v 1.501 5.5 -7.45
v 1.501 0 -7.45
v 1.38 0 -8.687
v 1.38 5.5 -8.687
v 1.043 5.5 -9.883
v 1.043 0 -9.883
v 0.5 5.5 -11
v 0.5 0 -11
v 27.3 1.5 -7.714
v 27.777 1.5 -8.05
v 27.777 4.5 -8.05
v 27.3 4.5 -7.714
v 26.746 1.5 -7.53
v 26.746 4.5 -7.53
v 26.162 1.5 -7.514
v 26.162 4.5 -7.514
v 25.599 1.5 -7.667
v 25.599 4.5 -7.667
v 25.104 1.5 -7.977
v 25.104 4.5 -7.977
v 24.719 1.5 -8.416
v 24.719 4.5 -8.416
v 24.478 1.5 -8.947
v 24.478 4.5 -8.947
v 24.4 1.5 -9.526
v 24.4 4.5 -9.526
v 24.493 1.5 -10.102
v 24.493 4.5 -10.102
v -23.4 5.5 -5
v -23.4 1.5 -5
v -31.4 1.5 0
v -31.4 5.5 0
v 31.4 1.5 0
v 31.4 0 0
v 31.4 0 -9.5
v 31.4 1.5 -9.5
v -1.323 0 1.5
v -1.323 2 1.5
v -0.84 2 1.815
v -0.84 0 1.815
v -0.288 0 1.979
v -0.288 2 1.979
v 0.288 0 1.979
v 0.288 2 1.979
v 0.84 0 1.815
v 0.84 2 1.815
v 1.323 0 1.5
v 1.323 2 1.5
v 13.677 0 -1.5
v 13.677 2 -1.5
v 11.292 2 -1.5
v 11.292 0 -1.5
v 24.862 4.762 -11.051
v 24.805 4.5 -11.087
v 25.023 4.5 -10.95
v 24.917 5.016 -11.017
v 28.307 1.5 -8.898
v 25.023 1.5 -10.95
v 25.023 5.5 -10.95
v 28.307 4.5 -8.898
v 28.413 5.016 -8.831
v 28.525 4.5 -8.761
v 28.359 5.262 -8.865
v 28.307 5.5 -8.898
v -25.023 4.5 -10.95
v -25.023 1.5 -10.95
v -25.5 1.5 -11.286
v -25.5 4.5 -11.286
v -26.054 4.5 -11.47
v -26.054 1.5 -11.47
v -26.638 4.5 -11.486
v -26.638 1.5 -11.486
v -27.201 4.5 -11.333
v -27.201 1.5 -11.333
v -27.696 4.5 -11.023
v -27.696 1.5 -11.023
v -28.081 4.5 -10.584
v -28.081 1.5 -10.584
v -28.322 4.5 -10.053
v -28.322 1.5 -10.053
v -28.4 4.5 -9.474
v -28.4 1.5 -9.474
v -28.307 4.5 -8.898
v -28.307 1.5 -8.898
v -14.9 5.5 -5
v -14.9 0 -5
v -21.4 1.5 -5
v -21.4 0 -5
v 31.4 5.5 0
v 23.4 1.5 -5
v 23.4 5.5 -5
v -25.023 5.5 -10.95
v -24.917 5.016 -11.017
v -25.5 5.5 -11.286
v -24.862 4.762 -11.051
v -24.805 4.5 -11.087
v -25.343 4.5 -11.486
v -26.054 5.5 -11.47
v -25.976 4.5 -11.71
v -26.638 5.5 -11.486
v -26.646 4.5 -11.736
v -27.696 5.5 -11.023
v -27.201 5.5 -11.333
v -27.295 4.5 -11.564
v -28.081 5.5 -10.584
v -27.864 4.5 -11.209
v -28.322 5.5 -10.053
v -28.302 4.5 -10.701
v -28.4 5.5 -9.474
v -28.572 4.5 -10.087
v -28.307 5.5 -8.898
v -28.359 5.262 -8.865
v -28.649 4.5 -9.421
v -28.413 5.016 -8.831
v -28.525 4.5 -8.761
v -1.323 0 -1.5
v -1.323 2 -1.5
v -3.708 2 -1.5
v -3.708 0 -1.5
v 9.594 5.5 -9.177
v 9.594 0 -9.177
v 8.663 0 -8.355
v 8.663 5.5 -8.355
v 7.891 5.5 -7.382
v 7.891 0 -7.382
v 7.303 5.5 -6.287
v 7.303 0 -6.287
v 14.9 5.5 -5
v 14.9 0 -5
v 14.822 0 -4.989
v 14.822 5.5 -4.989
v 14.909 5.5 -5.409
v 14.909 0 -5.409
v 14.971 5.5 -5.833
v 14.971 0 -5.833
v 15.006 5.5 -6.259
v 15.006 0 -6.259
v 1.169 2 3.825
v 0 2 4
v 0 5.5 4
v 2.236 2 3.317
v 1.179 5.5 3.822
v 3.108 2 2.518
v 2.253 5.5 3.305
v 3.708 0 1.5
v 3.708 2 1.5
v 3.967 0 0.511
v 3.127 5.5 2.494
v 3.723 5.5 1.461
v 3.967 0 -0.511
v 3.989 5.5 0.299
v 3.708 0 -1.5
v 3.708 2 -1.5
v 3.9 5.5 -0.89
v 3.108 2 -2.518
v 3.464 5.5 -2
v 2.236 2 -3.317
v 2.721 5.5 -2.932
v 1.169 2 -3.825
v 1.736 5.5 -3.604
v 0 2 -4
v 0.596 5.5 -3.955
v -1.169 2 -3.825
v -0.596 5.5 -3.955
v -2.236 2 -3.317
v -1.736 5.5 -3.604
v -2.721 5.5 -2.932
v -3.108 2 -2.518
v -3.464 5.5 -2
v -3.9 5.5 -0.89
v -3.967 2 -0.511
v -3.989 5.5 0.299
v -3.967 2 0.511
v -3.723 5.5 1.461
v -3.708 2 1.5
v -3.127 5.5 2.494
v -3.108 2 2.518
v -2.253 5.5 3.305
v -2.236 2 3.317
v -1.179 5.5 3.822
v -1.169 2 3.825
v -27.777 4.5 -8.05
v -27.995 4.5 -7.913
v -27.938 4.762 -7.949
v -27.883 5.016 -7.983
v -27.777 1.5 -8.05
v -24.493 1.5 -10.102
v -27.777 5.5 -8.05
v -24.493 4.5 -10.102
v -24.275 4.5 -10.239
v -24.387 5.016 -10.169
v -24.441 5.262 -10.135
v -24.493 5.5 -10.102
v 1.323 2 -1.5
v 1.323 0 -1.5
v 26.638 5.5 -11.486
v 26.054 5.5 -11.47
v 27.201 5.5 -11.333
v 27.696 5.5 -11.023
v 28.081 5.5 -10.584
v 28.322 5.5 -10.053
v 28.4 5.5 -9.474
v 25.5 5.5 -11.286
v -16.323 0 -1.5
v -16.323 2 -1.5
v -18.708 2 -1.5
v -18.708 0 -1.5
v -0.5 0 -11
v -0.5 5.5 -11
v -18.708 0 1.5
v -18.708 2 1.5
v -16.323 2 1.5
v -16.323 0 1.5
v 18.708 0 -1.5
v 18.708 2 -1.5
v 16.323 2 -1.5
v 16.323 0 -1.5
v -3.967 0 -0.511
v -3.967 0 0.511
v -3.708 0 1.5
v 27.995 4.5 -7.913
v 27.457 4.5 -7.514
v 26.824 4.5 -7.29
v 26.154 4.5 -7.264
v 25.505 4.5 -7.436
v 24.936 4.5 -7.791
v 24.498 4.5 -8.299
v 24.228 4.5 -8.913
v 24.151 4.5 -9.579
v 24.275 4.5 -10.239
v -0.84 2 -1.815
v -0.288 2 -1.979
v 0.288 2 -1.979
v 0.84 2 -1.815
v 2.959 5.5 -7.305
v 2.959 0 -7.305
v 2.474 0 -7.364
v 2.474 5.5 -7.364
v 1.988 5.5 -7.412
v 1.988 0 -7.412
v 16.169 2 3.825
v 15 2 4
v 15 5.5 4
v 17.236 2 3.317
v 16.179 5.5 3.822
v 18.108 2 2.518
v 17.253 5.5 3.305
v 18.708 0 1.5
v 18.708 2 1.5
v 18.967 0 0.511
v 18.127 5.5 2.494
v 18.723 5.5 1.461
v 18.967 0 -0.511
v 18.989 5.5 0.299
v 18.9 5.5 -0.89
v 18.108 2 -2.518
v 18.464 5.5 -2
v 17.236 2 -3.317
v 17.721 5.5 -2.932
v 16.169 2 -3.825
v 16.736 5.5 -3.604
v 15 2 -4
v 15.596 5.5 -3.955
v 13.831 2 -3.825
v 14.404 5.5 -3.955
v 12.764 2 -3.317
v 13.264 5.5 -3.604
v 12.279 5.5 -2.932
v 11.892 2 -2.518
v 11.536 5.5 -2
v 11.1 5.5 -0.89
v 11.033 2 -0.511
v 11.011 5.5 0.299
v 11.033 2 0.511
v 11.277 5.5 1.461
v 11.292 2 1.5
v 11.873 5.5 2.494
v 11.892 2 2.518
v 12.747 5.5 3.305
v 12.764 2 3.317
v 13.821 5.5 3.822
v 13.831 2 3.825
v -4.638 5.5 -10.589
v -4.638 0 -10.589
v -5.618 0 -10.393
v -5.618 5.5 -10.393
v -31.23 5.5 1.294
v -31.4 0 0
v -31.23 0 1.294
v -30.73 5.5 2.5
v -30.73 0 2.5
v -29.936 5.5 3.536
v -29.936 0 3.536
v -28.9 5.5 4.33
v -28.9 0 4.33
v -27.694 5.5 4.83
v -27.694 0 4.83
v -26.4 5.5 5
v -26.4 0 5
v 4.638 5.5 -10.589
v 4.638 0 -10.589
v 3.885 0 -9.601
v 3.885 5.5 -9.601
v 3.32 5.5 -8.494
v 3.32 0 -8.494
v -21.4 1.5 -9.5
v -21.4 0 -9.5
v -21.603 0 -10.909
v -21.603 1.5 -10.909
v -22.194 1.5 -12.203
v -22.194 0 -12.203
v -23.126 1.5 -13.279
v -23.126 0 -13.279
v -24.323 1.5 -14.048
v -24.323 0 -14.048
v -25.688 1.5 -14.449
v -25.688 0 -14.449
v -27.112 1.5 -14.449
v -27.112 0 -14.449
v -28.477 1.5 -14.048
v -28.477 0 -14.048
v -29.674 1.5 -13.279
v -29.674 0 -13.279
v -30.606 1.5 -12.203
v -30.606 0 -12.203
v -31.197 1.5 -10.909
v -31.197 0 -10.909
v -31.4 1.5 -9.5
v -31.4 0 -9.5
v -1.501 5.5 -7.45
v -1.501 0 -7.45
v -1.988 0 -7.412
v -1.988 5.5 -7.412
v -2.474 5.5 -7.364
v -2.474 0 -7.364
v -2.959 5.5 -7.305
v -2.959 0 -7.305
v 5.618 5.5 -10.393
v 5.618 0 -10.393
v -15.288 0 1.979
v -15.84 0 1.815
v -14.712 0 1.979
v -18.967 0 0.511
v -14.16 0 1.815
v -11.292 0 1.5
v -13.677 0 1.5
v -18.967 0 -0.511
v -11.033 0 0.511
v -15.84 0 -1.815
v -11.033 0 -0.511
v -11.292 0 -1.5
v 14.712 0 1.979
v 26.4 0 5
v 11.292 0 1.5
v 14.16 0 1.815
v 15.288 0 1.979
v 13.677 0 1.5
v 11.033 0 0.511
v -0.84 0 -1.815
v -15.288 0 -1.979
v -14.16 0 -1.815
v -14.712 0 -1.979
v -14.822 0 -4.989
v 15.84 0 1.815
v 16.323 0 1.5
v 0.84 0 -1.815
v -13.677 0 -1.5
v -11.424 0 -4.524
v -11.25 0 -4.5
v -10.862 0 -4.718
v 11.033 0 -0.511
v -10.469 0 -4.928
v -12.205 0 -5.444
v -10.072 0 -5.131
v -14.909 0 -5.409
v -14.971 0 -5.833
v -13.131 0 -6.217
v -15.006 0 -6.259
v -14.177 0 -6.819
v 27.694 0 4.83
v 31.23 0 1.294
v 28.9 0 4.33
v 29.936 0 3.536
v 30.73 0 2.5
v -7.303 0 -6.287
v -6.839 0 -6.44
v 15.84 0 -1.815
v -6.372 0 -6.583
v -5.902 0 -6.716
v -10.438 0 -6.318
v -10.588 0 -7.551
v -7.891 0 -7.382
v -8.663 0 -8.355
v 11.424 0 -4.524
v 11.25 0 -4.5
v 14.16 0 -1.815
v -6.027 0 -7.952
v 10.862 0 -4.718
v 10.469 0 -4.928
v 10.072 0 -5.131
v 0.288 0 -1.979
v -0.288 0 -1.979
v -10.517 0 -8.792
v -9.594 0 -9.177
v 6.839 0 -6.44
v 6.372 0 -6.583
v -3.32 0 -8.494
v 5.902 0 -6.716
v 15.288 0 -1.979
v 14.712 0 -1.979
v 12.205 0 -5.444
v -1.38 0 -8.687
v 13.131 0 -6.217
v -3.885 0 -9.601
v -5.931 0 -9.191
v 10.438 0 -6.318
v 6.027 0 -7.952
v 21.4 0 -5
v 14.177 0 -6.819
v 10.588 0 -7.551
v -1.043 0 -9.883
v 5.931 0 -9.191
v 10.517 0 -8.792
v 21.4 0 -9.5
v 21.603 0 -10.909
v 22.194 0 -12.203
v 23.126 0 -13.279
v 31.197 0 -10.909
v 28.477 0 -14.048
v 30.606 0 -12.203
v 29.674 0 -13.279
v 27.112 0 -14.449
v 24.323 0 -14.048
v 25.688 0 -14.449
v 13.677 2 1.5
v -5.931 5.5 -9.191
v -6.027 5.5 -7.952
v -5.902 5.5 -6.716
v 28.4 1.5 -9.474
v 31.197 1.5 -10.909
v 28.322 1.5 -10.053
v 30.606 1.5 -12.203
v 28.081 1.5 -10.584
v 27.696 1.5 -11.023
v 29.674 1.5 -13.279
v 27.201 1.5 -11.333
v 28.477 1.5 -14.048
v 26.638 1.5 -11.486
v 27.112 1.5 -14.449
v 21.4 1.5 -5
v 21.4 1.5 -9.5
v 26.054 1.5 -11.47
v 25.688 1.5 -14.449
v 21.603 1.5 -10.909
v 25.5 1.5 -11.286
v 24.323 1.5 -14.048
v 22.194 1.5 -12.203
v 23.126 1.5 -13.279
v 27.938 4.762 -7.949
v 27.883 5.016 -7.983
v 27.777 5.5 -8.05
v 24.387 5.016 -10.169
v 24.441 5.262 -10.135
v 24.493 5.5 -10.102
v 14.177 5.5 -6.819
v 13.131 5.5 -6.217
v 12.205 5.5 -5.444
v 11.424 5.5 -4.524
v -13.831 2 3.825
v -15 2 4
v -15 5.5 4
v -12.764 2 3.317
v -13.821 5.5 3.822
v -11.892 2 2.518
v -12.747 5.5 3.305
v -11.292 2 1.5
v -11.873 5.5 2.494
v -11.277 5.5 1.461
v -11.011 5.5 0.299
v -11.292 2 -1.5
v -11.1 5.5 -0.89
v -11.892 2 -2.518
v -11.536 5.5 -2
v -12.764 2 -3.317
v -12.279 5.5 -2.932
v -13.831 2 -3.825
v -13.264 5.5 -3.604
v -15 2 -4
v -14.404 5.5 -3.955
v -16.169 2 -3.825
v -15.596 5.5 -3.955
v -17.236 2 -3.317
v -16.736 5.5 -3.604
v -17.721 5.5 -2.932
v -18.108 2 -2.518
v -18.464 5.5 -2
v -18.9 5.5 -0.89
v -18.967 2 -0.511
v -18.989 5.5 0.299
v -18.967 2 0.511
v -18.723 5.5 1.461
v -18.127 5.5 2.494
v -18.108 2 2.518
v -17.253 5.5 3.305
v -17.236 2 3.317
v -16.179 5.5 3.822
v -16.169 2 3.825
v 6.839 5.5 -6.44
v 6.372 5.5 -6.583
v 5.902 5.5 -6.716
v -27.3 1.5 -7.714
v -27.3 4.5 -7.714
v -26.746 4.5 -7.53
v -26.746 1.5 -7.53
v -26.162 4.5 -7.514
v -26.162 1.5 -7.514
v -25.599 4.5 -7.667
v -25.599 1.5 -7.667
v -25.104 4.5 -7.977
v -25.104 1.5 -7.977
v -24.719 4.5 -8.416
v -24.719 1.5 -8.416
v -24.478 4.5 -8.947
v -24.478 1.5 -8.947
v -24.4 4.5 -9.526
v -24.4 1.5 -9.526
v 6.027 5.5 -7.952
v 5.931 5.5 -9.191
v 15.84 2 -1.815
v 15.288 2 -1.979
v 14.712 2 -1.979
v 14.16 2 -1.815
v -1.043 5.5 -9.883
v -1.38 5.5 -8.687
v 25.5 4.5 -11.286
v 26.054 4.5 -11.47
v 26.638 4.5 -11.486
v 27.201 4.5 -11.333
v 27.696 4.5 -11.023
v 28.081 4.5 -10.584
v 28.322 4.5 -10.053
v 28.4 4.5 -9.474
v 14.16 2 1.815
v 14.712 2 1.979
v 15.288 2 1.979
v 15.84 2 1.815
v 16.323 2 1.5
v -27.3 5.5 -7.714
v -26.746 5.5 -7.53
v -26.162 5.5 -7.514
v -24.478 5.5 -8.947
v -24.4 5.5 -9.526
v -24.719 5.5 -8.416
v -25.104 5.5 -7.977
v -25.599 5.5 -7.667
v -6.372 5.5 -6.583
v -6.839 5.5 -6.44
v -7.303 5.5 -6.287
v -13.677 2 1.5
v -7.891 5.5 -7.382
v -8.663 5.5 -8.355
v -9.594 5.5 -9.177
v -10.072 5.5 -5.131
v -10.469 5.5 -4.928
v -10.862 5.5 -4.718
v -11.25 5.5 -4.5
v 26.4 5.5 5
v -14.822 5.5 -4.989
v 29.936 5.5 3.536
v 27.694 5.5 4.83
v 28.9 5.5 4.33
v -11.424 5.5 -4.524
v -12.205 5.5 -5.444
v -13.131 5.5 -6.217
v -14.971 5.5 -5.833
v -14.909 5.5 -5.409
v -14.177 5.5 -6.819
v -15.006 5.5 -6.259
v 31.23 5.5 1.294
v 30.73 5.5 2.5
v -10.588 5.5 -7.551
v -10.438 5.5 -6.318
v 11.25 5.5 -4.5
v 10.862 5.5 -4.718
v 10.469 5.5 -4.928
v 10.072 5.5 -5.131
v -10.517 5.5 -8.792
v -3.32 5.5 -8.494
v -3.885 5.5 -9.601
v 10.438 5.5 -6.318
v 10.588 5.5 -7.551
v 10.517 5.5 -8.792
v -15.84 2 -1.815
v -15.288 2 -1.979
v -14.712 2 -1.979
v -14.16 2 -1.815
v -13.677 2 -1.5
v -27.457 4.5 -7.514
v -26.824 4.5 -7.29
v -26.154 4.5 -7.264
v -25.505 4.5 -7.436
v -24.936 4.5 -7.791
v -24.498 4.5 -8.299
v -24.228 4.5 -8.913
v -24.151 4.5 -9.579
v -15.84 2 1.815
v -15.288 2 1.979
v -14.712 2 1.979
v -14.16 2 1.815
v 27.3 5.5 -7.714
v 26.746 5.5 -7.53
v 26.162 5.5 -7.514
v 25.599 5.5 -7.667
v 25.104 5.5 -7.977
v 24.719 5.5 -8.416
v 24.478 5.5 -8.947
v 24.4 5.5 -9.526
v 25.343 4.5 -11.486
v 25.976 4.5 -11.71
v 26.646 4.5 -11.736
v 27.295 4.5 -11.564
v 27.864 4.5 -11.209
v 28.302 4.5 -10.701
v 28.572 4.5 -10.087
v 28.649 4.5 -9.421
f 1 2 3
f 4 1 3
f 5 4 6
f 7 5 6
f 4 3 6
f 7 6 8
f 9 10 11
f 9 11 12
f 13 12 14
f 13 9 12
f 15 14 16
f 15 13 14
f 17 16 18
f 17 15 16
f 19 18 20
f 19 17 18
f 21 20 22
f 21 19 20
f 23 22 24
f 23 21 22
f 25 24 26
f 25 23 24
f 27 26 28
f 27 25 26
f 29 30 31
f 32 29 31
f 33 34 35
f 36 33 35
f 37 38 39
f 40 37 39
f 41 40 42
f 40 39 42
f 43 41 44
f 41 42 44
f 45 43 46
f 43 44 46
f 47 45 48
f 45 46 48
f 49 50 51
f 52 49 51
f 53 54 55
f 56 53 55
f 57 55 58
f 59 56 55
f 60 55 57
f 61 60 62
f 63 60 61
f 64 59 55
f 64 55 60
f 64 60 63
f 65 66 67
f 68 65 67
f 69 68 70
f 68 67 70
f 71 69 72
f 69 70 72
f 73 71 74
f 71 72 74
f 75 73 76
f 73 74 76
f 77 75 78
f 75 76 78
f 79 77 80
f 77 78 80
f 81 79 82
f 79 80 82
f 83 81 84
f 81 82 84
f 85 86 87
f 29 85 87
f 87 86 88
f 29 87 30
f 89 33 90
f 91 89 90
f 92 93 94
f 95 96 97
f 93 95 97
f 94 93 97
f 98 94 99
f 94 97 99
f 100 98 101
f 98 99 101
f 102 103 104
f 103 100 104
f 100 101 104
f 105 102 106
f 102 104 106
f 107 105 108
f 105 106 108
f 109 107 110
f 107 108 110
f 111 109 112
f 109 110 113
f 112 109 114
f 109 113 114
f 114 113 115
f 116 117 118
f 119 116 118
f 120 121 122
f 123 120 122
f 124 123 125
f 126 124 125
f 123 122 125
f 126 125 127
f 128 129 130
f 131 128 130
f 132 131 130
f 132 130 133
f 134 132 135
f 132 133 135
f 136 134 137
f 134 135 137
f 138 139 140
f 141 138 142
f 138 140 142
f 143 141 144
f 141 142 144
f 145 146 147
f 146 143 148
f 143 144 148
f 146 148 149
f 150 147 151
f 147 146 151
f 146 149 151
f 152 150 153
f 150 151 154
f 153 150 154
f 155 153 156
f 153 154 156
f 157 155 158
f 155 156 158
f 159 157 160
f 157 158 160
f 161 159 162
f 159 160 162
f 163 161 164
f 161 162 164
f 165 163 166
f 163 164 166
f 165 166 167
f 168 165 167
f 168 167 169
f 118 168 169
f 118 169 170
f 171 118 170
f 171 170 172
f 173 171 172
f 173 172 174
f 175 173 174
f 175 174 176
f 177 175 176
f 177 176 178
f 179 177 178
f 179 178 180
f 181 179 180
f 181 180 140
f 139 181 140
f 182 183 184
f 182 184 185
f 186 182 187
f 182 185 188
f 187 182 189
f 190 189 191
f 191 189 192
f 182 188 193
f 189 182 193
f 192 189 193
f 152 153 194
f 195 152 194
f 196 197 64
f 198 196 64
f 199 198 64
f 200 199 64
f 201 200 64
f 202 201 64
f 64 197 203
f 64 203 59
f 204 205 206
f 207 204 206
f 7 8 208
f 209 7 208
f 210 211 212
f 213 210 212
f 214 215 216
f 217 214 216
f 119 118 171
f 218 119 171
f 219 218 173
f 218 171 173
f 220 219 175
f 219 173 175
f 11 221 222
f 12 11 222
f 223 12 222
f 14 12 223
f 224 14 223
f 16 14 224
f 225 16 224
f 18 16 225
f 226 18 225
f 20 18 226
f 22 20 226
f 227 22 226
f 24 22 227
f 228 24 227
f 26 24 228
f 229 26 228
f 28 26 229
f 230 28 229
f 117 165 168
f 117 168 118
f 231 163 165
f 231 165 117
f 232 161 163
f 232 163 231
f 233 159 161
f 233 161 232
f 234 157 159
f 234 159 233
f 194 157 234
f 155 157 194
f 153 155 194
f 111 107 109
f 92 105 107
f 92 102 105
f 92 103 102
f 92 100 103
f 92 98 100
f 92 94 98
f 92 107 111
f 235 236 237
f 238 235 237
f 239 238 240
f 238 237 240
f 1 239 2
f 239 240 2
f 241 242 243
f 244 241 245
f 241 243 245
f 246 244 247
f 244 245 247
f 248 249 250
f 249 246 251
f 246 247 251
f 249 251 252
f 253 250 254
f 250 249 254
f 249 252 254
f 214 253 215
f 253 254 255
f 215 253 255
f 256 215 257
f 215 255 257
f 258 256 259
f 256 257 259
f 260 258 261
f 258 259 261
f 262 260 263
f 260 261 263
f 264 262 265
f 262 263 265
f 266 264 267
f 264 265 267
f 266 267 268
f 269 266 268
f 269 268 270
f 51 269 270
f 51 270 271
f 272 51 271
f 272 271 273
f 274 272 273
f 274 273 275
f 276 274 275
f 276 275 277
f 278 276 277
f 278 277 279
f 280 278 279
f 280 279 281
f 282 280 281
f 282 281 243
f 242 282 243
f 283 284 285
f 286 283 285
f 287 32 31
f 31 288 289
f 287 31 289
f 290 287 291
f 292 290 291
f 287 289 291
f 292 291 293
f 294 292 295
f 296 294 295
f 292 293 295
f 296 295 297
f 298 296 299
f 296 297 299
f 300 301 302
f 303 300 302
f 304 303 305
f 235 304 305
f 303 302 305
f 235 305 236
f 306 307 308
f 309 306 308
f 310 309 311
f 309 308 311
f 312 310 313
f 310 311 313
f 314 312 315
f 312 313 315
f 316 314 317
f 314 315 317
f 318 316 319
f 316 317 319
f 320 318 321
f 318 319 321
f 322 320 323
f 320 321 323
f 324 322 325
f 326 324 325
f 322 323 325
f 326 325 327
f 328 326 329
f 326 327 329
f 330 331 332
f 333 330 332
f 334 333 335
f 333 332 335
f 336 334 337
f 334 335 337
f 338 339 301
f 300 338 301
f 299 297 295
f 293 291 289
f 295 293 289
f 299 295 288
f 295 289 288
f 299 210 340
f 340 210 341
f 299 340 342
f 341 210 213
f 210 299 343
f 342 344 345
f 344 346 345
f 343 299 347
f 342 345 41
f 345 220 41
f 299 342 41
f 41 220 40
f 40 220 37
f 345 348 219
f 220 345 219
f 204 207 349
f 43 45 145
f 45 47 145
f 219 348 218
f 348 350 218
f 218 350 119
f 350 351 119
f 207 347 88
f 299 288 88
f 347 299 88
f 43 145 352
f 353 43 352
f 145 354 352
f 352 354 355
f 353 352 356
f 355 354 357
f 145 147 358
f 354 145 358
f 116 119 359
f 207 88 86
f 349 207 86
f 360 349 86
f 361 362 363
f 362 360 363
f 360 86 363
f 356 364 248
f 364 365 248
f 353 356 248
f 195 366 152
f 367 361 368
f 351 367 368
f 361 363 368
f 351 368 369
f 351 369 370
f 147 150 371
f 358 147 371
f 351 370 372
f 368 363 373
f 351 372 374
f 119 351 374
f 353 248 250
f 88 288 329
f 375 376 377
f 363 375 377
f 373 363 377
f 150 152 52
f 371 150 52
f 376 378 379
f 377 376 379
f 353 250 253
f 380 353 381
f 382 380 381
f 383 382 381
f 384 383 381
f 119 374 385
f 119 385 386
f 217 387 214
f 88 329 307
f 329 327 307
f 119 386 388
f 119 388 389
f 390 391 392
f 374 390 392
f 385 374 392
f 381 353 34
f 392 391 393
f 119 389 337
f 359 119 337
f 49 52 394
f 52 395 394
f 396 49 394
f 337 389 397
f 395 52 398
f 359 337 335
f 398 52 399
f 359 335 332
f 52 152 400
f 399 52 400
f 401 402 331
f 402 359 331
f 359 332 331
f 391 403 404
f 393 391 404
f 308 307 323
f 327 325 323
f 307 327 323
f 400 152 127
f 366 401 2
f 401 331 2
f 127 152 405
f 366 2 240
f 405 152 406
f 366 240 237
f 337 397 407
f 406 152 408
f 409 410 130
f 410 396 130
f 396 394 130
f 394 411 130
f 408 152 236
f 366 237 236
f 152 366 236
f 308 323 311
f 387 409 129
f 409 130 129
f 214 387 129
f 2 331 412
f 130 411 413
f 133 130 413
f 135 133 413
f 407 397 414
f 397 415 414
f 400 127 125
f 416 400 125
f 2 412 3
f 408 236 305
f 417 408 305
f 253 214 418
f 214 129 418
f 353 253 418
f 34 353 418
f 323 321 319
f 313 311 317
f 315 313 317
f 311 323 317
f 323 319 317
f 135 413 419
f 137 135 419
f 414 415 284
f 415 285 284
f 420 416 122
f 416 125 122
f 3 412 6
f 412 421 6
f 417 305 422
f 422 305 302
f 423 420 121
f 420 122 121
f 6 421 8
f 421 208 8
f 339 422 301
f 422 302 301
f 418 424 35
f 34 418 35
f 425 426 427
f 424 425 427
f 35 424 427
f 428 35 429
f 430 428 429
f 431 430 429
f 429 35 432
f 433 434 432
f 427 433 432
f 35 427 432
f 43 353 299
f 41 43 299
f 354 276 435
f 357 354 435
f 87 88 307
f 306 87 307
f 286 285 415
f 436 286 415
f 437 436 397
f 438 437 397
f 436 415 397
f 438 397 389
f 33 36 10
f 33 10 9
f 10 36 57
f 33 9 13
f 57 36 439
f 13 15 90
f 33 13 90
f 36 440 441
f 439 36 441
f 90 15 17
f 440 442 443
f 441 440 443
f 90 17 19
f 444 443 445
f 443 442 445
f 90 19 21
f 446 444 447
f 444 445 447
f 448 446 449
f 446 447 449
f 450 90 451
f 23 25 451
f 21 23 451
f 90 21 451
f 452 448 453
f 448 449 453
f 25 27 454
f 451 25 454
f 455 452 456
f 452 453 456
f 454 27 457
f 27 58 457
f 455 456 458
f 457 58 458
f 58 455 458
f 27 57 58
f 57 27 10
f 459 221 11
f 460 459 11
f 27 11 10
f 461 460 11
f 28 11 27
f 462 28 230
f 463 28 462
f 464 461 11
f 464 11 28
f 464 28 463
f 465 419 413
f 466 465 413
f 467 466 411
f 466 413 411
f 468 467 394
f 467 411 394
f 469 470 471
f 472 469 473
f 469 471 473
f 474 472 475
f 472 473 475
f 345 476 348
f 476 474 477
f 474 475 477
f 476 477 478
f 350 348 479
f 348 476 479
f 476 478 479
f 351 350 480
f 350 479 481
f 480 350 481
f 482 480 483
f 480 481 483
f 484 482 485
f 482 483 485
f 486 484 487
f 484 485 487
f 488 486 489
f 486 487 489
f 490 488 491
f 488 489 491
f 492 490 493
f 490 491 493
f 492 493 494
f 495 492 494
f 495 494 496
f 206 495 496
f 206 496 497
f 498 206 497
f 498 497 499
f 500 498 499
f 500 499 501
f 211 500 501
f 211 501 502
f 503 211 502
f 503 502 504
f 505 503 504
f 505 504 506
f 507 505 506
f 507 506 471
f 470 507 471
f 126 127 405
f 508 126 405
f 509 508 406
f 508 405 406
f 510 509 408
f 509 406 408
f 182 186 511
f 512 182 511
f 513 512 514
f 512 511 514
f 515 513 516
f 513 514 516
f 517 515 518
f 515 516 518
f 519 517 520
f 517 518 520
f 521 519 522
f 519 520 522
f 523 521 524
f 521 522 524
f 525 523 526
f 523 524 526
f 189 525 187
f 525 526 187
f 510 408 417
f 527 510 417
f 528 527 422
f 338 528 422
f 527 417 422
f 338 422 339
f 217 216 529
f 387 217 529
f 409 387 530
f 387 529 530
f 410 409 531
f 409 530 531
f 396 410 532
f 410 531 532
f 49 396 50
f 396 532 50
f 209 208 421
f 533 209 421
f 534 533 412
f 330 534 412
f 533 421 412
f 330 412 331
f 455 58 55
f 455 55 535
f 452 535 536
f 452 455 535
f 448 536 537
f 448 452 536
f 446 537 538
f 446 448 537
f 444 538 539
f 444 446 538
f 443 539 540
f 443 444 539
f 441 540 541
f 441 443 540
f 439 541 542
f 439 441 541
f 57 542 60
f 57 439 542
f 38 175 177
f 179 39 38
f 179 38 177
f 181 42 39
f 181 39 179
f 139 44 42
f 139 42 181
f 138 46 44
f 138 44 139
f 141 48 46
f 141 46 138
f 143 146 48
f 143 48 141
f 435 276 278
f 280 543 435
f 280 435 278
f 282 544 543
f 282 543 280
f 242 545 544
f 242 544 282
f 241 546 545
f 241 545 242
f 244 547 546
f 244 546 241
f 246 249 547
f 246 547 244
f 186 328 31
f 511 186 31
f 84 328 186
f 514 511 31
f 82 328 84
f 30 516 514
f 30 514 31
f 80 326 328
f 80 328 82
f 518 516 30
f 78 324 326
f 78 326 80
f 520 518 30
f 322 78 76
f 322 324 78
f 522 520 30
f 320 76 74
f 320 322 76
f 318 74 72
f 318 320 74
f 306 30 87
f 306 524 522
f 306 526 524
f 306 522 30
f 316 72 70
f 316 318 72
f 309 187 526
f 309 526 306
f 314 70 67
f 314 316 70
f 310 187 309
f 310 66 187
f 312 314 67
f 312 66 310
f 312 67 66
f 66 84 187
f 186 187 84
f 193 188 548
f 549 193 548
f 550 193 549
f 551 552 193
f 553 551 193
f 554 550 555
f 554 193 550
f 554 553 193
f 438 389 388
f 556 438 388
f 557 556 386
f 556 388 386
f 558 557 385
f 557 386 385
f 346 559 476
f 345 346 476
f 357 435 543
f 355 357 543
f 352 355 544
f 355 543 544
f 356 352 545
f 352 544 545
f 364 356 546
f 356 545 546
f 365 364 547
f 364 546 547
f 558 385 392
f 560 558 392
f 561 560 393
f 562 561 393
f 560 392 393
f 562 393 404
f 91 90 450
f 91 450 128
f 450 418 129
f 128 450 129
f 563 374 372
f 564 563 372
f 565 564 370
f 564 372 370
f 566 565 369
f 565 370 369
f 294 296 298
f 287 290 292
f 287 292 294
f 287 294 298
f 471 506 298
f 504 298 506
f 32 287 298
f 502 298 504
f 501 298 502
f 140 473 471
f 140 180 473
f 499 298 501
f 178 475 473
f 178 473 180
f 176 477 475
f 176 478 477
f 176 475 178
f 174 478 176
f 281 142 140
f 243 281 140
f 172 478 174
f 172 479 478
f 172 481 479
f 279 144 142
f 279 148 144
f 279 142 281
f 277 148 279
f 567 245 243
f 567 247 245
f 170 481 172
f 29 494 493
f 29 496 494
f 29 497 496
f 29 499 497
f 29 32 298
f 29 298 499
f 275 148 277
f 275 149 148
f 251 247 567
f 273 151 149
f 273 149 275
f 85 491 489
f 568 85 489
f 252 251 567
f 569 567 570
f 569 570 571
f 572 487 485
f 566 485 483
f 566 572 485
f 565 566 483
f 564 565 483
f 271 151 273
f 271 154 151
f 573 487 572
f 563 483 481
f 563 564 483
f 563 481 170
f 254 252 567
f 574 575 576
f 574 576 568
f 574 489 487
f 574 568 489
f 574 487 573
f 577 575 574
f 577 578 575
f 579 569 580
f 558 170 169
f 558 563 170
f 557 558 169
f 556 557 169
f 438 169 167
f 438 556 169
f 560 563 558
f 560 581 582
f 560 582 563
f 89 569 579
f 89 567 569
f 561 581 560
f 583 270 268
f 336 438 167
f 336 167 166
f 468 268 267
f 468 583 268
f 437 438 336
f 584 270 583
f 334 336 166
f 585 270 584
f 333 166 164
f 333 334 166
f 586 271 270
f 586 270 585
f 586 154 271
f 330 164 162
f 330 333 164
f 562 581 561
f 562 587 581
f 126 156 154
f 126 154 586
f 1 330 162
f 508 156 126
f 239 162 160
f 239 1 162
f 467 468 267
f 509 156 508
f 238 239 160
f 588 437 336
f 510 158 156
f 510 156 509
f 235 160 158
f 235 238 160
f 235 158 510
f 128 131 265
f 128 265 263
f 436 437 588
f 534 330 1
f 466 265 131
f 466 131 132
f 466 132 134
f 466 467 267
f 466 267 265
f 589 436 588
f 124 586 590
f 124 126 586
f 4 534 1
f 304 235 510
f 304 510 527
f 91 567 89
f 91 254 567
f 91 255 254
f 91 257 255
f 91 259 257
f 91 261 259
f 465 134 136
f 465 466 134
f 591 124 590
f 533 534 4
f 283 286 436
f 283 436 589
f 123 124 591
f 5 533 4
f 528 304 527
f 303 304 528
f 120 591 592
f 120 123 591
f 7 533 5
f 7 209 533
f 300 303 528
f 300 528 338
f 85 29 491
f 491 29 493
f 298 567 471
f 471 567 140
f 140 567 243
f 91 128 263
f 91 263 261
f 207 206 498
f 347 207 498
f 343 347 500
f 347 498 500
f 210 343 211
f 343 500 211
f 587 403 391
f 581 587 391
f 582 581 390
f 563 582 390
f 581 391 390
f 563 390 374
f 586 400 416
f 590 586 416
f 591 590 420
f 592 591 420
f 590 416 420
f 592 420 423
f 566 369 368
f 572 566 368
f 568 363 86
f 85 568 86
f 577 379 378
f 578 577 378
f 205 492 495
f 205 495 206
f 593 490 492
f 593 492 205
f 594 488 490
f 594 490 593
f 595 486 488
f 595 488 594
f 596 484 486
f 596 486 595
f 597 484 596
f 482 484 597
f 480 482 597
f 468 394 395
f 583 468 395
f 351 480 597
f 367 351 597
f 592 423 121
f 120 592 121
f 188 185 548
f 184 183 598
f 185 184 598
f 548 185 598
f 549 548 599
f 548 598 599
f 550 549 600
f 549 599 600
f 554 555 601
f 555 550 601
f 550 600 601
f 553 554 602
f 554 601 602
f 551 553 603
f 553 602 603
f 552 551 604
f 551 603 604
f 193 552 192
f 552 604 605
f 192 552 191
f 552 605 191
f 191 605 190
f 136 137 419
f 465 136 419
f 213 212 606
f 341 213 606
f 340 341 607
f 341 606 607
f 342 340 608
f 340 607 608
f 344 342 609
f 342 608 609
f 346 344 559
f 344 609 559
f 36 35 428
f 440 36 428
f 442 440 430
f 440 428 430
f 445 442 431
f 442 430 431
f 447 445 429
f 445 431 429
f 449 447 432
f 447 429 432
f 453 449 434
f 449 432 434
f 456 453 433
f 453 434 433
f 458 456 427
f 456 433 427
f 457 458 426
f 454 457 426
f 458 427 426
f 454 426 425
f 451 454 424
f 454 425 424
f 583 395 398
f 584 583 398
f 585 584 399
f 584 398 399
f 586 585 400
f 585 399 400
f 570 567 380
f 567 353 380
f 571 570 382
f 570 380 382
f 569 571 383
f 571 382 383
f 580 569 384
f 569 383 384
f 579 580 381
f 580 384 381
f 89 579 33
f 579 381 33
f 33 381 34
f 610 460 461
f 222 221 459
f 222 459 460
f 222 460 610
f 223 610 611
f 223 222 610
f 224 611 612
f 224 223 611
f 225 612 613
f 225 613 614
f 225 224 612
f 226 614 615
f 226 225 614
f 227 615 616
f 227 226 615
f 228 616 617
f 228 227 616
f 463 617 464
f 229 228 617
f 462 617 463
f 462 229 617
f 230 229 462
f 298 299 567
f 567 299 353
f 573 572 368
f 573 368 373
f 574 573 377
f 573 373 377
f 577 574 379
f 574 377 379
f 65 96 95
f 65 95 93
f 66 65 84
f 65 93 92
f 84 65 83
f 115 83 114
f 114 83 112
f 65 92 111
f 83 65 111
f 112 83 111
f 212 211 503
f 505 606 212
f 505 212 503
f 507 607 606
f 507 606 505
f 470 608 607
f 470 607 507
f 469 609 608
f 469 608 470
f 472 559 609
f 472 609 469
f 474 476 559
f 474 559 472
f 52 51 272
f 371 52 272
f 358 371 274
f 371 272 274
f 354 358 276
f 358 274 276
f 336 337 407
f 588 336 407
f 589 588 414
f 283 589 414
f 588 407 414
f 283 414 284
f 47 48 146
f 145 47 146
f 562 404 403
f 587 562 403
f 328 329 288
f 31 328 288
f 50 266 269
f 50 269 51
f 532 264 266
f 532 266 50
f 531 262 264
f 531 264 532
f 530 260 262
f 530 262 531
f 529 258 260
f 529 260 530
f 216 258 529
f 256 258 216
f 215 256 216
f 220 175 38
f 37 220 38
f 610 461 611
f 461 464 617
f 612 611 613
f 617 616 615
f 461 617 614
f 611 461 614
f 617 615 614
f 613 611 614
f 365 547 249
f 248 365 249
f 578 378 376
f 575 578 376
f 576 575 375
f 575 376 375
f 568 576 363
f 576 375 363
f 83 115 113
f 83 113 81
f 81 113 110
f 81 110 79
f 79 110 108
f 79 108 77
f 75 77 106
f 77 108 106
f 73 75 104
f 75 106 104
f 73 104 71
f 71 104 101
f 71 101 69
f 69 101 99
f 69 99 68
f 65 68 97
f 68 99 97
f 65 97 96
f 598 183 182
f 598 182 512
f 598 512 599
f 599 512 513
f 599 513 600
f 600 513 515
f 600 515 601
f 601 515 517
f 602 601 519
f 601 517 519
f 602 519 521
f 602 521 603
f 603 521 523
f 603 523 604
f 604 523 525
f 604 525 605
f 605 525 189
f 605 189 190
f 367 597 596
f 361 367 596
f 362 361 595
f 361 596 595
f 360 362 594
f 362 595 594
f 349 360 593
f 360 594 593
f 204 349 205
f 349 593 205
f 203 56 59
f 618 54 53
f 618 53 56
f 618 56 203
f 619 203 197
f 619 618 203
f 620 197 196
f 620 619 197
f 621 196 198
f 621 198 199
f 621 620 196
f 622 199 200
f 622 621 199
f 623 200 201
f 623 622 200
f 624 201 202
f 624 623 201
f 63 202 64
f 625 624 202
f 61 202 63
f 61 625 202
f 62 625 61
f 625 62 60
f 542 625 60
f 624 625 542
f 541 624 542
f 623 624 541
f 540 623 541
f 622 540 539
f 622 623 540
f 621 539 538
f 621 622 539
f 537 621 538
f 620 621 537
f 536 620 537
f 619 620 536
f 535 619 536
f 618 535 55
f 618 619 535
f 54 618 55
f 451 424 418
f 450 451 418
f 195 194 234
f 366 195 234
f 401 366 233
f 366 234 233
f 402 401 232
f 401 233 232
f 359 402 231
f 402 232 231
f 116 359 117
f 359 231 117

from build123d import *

# Parameters (mm, degrees)
EXTRUDE_1_DEPTH                  = 1.5
EXTRUDE_2_DEPTH                  = 4
EXTRUDE_3_DEPTH                  = 5.5
PATTERN_CIRCULAR_1_COUNT         = 4
PATTERN_CIRCULAR_1_ANGLE         = 34
PATTERN_CIRCULAR_2_COPY_1_DEPTH  = 5.5
PATTERN_CIRCULAR_2_COPY_2_DEPTH  = 5.5
PATTERN_CIRCULAR_2_COPY_3_DEPTH  = 5.5
PATTERN_CIRCULAR_2_COPY_4_DEPTH  = 5.5
PATTERN_CIRCULAR_2_COPY_5_DEPTH  = 5.5
PATTERN_CIRCULAR_2_COPY_6_DEPTH  = 5.5
PATTERN_CIRCULAR_2_COPY_7_DEPTH  = 5.5
PATTERN_CIRCULAR_2_COPY_8_DEPTH  = 5.5
PATTERN_CIRCULAR_2_COPY_9_DEPTH  = 5.5
PATTERN_CIRCULAR_2_COPY_10_DEPTH = 5.5
PATTERN_CIRCULAR_2_COPY_11_DEPTH = 5.5
PATTERN_CIRCULAR_2_COPY_12_DEPTH = 5.5
SKETCH_4_R                       = 4
CUT_EXTRUDE_1_DEPTH              = 3.5
CUT_EXTRUDE_2_DEPTH              = 35.76291127
PATTERN_LINEAR_1_COUNT           = 2
PATTERN_LINEAR_1_PITCH           = 15
PATTERN_LINEAR_1_COL_COUNT       = 2
PATTERN_LINEAR_1_COL_PITCH       = 15
SKETCH_6_R                       = 2
EXTRUDE_4_DEPTH                  = 4
SKETCH_8_R                       = 2
SKETCH_7_R                       = 2.25
CUT_EXTRUDE_3_DEPTH              = 4


with BuildPart() as part:
    # 草图1 → 凸台-拉伸1 (new body)
    with BuildSketch(Plane(origin=(0, 0, 0), x_dir=(1, 0, 0), z_dir=(0, 1, 0))):
        with BuildLine():
            Line((-26.4, -5), (26.4, -5))
            ThreePointArc((26.4, -5), (29.935533906, -3.535533906), (31.4, 0))
            Line((31.4, 0), (31.4, 9.5))
            ThreePointArc((31.4, 9.5), (26.4, 14.5), (21.4, 9.5))
            Line((21.4, 9.5), (21.4, 5))
            Line((21.4, 5), (14.9, 5))
            Line((14.9, 5), (11.25, 4.5))
            ThreePointArc((11.25, 4.5), (0, 7.5), (-11.25, 4.5))
            Line((-11.25, 4.5), (-14.9, 5))
            Line((-14.9, 5), (-21.4, 5))
            Line((-21.4, 5), (-21.4, 9.5))
            ThreePointArc((-21.4, 9.5), (-26.4, 14.5), (-31.4, 9.5))
            Line((-31.4, 9.5), (-31.4, 0))
            ThreePointArc((-31.4, 0), (-29.935533906, -3.535533906), (-26.4, -5))
        make_face()
    extrude(amount=EXTRUDE_1_DEPTH)

    # 草图2 → 凸台-拉伸2 (add)
    with BuildSketch(Plane(origin=(0, 1.5, 0), x_dir=(1, 0, 0), z_dir=(0, 1, 0))):
        with BuildLine():
            Line((-21.4, 5), (-23.4, 5))
            Line((-23.4, 5), (-31.4, 0))
            ThreePointArc((-31.4, 0), (-29.935533906, -3.535533906), (-26.4, -5))
            Line((-26.4, -5), (26.4, -5))
            ThreePointArc((26.4, -5), (29.935533906, -3.535533906), (31.4, 0))
            Line((31.4, 0), (23.4, 5))
            Line((23.4, 5), (21.4, 5))
            Line((21.4, 5), (14.9, 5))
            Line((14.9, 5), (11.25, 4.5))
            ThreePointArc((11.25, 4.5), (0, 7.5), (-11.25, 4.5))
            Line((-11.25, 4.5), (-14.9, 5))
            Line((-14.9, 5), (-21.4, 5))
        make_face()
    extrude(amount=EXTRUDE_2_DEPTH)

    # 草图3 → 凸台-拉伸3 (add)
    with BuildSketch(Plane(origin=(0, 0, 0), x_dir=(1, 0, 0), z_dir=(0, 1, 0))):
        with BuildLine():
            Line((0.5, 11), (-0.5, 11))
            ThreePointArc((-0.5, 11), (-1.238266188, 9.292132892), (-1.500585783, 7.450113497))
            ThreePointArc((-1.500585783, 7.450113497), (0, 7.5), (1.500585783, 7.450113497))
            ThreePointArc((1.500585783, 7.450113497), (1.238266188, 9.292132892), (0.5, 11))
        make_face()
    extrude_3 = extrude(amount=EXTRUDE_3_DEPTH)

    # 阵列(圆周)1: 凸台-拉伸3 ×4 about axis
    pattern_circular_1_axis = Axis((0, 0, 15.09375), (0, -1, 0))
    for i in range(1, PATTERN_CIRCULAR_1_COUNT):
        add(extrude_3.rotate(pattern_circular_1_axis, i * PATTERN_CIRCULAR_1_ANGLE / (PATTERN_CIRCULAR_1_COUNT - 1)))

    # 阵列(圆周)2 copy 1 sketch → 阵列(圆周)2 copy 1 (add)
    with BuildSketch(Plane(origin=(0, 0, 0), x_dir=(1, 0, 0), z_dir=(0, 1, 0))):
        with BuildLine():
            Line((0.5, 11), (-0.5, 11))
            ThreePointArc((-0.5, 11), (-1.238266188, 9.292132892), (-1.500585783, 7.450113497))
            ThreePointArc((-1.500585783, 7.450113497), (0, 7.5), (1.500585783, 7.450113497))
            ThreePointArc((1.500585783, 7.450113497), (1.238266188, 9.292132892), (0.5, 11))
        make_face()
    extrude(amount=PATTERN_CIRCULAR_2_COPY_1_DEPTH)

    # 阵列(圆周)2 copy 2 sketch → 阵列(圆周)2 copy 2 (add)
    with BuildSketch(Plane(origin=(-2.966172575, 0, 0.294320642), x_dir=(0.9805004957559792, 0, -0.1965166095328305), z_dir=(0, 1, 0))):
        with BuildLine():
            Line((0.5, 11), (-0.5, 11))
            ThreePointArc((-0.5, 11), (-1.238266188, 9.292132892), (-1.500585783, 7.450113497))
            ThreePointArc((-1.500585783, 7.450113497), (0, 7.5), (1.500585783, 7.450113497))
            ThreePointArc((1.500585783, 7.450113497), (1.238266188, 9.292132892), (0.5, 11))
        make_face()
    extrude(amount=PATTERN_CIRCULAR_2_COPY_2_DEPTH)

    # 阵列(圆周)2 copy 3 sketch → 阵列(圆周)2 copy 3 (add)
    with BuildSketch(Plane(origin=(-5.816667361, 0, 1.165804356), x_dir=(0.922762444355442, 0, -0.3853692661424491), z_dir=(0, 1, 0))):
        with BuildLine():
            Line((0.5, 11), (-0.5, 11))
            ThreePointArc((-0.5, 11), (-1.238266188, 9.292132892), (-1.500585783, 7.450113497))
            ThreePointArc((-1.500585783, 7.450113497), (0, 7.5), (1.500585783, 7.450113497))
            ThreePointArc((1.500585783, 7.450113497), (1.238266188, 9.292132892), (0.5, 11))
        make_face()
    extrude(amount=PATTERN_CIRCULAR_2_COPY_3_DEPTH)

    # 阵列(圆周)2 copy 4 sketch → 阵列(圆周)2 copy 4 (add)
    with BuildSketch(Plane(origin=(2.966172575, 0, 0.294320642), x_dir=(0.9805004957559792, 0, 0.1965166095328305), z_dir=(0, 1, 0))):
        with BuildLine():
            Line((0.5, 11), (-0.5, 11))
            ThreePointArc((-0.5, 11), (-1.238266188, 9.292132892), (-1.500585783, 7.450113497))
            ThreePointArc((-1.500585783, 7.450113497), (0, 7.5), (1.500585783, 7.450113497))
            ThreePointArc((1.500585783, 7.450113497), (1.238266188, 9.292132892), (0.5, 11))
        make_face()
    extrude(amount=PATTERN_CIRCULAR_2_COPY_4_DEPTH)

    # 阵列(圆周)2 copy 5 sketch → 阵列(圆周)2 copy 5 (add)
    with BuildSketch(Plane(origin=(0, 0, 0), x_dir=(1, 0, 0), z_dir=(0, 1, 0))):
        with BuildLine():
            Line((0.5, 11), (-0.5, 11))
            ThreePointArc((-0.5, 11), (-1.238266188, 9.292132892), (-1.500585783, 7.450113497))
            ThreePointArc((-1.500585783, 7.450113497), (0, 7.5), (1.500585783, 7.450113497))
            ThreePointArc((1.500585783, 7.450113497), (1.238266188, 9.292132892), (0.5, 11))
        make_face()
    extrude(amount=PATTERN_CIRCULAR_2_COPY_5_DEPTH)

    # 阵列(圆周)2 copy 6 sketch → 阵列(圆周)2 copy 6 (add)
    with BuildSketch(Plane(origin=(-2.966172575, 0, 0.294320642), x_dir=(0.9805004957559792, 0, -0.19651660953283062), z_dir=(0, 1, 0))):
        with BuildLine():
            Line((0.5, 11), (-0.5, 11))
            ThreePointArc((-0.5, 11), (-1.238266188, 9.292132892), (-1.500585783, 7.450113497))
            ThreePointArc((-1.500585783, 7.450113497), (0, 7.5), (1.500585783, 7.450113497))
            ThreePointArc((1.500585783, 7.450113497), (1.238266188, 9.292132892), (0.5, 11))
        make_face()
    extrude(amount=PATTERN_CIRCULAR_2_COPY_6_DEPTH)

    # 阵列(圆周)2 copy 7 sketch → 阵列(圆周)2 copy 7 (add)
    with BuildSketch(Plane(origin=(5.816667361, 0, 1.165804356), x_dir=(0.922762444355442, 0, 0.3853692661424491), z_dir=(0, 1, 0))):
        with BuildLine():
            Line((0.5, 11), (-0.5, 11))
            ThreePointArc((-0.5, 11), (-1.238266188, 9.292132892), (-1.500585783, 7.450113497))
            ThreePointArc((-1.500585783, 7.450113497), (0, 7.5), (1.500585783, 7.450113497))
            ThreePointArc((1.500585783, 7.450113497), (1.238266188, 9.292132892), (0.5, 11))
        make_face()
    extrude(amount=PATTERN_CIRCULAR_2_COPY_7_DEPTH)

    # 阵列(圆周)2 copy 8 sketch → 阵列(圆周)2 copy 8 (add)
    with BuildSketch(Plane(origin=(2.966172575, 0, 0.294320642), x_dir=(0.9805004957559792, 0, 0.19651660953283062), z_dir=(0, 1, 0))):
        with BuildLine():
            Line((0.5, 11), (-0.5, 11))
            ThreePointArc((-0.5, 11), (-1.238266188, 9.292132892), (-1.500585783, 7.450113497))
            ThreePointArc((-1.500585783, 7.450113497), (0, 7.5), (1.500585783, 7.450113497))
            ThreePointArc((1.500585783, 7.450113497), (1.238266188, 9.292132892), (0.5, 11))
        make_face()
    extrude(amount=PATTERN_CIRCULAR_2_COPY_8_DEPTH)

    # 阵列(圆周)2 copy 9 sketch → 阵列(圆周)2 copy 9 (add)
    with BuildSketch(Plane(origin=(0, 0, 0), x_dir=(1, 0, 0), z_dir=(0, 1, 0))):
        with BuildLine():
            Line((0.5, 11), (-0.5, 11))
            ThreePointArc((-0.5, 11), (-1.238266188, 9.292132892), (-1.500585783, 7.450113497))
            ThreePointArc((-1.500585783, 7.450113497), (0, 7.5), (1.500585783, 7.450113497))
            ThreePointArc((1.500585783, 7.450113497), (1.238266188, 9.292132892), (0.5, 11))
        make_face()
    extrude(amount=PATTERN_CIRCULAR_2_COPY_9_DEPTH)

    # 阵列(圆周)2 copy 10 sketch → 阵列(圆周)2 copy 10 (add)
    with BuildSketch(Plane(origin=(-2.966172575, 0, 0.294320642), x_dir=(0.9805004957559792, 0, -0.19651660953283054), z_dir=(0, 1, 0))):
        with BuildLine():
            Line((0.5, 11), (-0.5, 11))
            ThreePointArc((-0.5, 11), (-1.238266188, 9.292132892), (-1.500585783, 7.450113497))
            ThreePointArc((-1.500585783, 7.450113497), (0, 7.5), (1.500585783, 7.450113497))
            ThreePointArc((1.500585783, 7.450113497), (1.238266188, 9.292132892), (0.5, 11))
        make_face()
    extrude(amount=PATTERN_CIRCULAR_2_COPY_10_DEPTH)

    # 阵列(圆周)2 copy 11 sketch → 阵列(圆周)2 copy 11 (add)
    with BuildSketch(Plane(origin=(-5.816667361, 0, 1.165804356), x_dir=(0.9227624443554421, 0, -0.38536926614244904), z_dir=(0, 1, 0))):
        with BuildLine():
            Line((0.5, 11), (-0.5, 11))
            ThreePointArc((-0.5, 11), (-1.238266188, 9.292132892), (-1.500585783, 7.450113497))
            ThreePointArc((-1.500585783, 7.450113497), (0, 7.5), (1.500585783, 7.450113497))
            ThreePointArc((1.500585783, 7.450113497), (1.238266188, 9.292132892), (0.5, 11))
        make_face()
    extrude(amount=PATTERN_CIRCULAR_2_COPY_11_DEPTH)

    # 阵列(圆周)2 copy 12 sketch → 阵列(圆周)2 copy 12 (add)
    with BuildSketch(Plane(origin=(-8.440317887, 0, 2.580464139), x_dir=(0.829037572555041, 0, -0.5591929034707479), z_dir=(0, 1, 0))):
        with BuildLine():
            Line((0.5, 11), (-0.5, 11))
            ThreePointArc((-0.5, 11), (-1.238266188, 9.292132892), (-1.500585783, 7.450113497))
            ThreePointArc((-1.500585783, 7.450113497), (0, 7.5), (1.500585783, 7.450113497))
            ThreePointArc((1.500585783, 7.450113497), (1.238266188, 9.292132892), (0.5, 11))
        make_face()
    extrude(amount=PATTERN_CIRCULAR_2_COPY_12_DEPTH)

    # 草图4 → 切除-拉伸1 (cut)
    with BuildSketch(Plane(origin=(0, 5.5, 0), x_dir=(1, 0, 0), z_dir=(0, 1, 0))):
        with Locations(Location((0, 0, 0), (0, 0, 270))):
            Circle(SKETCH_4_R)
    cut_extrude_1 = extrude(amount=-CUT_EXTRUDE_1_DEPTH, mode=Mode.SUBTRACT)

    # 草图5 → 切除-拉伸2 (cut, through all)
    with BuildSketch(Plane(origin=(0, 2, 0), x_dir=(1, 0, 0), z_dir=(0, 1, 0))):
        with BuildLine():
            Line((-1.322875656, 1.5), (-3.708099244, 1.5))
            ThreePointArc((-3.708099244, 1.5), (-4, 0), (-3.708099244, -1.5))
            Line((-3.708099244, -1.5), (-1.322875656, -1.5))
            ThreePointArc((-1.322875656, -1.5), (0, -2), (1.322875656, -1.5))
            Line((1.322875656, -1.5), (3.708099244, -1.5))
            ThreePointArc((3.708099244, -1.5), (4, 0), (3.708099244, 1.5))
            Line((3.708099244, 1.5), (1.322875656, 1.5))
            ThreePointArc((1.322875656, 1.5), (0, 2), (-1.322875656, 1.5))
        make_face()
    cut_extrude_2 = extrude(amount=-CUT_EXTRUDE_2_DEPTH, mode=Mode.SUBTRACT)

    # 阵列(线性)1: 切除-拉伸1, 切除-拉伸2 ×2
    with Locations(*[(-i * PATTERN_LINEAR_1_PITCH, 0, 0) for i in range(1, PATTERN_LINEAR_1_COUNT)]):
        add(cut_extrude_1, mode=Mode.SUBTRACT)
        add(cut_extrude_2, mode=Mode.SUBTRACT)

    # 阵列(线性)1 col: 切除-拉伸1, 切除-拉伸2 ×2
    with Locations(*[(i * PATTERN_LINEAR_1_COL_PITCH, 0, 0) for i in range(1, PATTERN_LINEAR_1_COL_COUNT)]):
        add(cut_extrude_1, mode=Mode.SUBTRACT)
        add(cut_extrude_2, mode=Mode.SUBTRACT)

    # 草图6 → 凸台-拉伸4 (add)
    with BuildSketch(Plane(origin=(0, 1.5, 0), x_dir=(1, 0, 0), z_dir=(0, 1, 0))):
        with Locations(Location((-26.4, 9.5, 0), (0, 0, 270))):
            Circle(SKETCH_6_R)
    extrude_4 = extrude(amount=EXTRUDE_4_DEPTH)

    # 草图8 → 放样1 section 0
    with BuildSketch(Plane(origin=(0, 5.5, 0), x_dir=(1, 0, 0), z_dir=(0, 1, 0))):
        with Locations((-26.4, 9.5)):
            Circle(SKETCH_8_R)
    # 草图7 → 放样1 section 1
    with BuildSketch(Plane(origin=(0, 4.5, 0), x_dir=(1, 0, 0), z_dir=(0, 1, 0))):
        with Locations((-26.4, 9.5)):
            Circle(SKETCH_7_R)
    loft_1 = loft()

    # 草图9 → 切除-拉伸3 (cut)
    with BuildSketch(Plane(origin=(0, 5.5, 0), x_dir=(1, 0, 0), z_dir=(0, 1, 0))):
        Polygon((-28.678995442, 7.486004028), (-23.591005618, 10.665997668), (-24.121004558, 11.513995972), (-29.208994382, 8.334002332), align=None)
    cut_extrude_3 = extrude(amount=-CUT_EXTRUDE_3_DEPTH, mode=Mode.SUBTRACT)

    # 镜向1: 凸台-拉伸4, 放样1, 切除-拉伸3 across plane
    add(extrude_4.mirror(Plane(origin=(0, 0, 0), x_dir=(0, 0, 1), z_dir=(1, 0, 0))))
    add(loft_1.mirror(Plane(origin=(0, 0, 0), x_dir=(0, 0, 1), z_dir=(1, 0, 0))))
    add(cut_extrude_3.mirror(Plane(origin=(0, 0, 0), x_dir=(0, 0, 1), z_dir=(1, 0, 0))), mode=Mode.SUBTRACT)


solid = part.part
